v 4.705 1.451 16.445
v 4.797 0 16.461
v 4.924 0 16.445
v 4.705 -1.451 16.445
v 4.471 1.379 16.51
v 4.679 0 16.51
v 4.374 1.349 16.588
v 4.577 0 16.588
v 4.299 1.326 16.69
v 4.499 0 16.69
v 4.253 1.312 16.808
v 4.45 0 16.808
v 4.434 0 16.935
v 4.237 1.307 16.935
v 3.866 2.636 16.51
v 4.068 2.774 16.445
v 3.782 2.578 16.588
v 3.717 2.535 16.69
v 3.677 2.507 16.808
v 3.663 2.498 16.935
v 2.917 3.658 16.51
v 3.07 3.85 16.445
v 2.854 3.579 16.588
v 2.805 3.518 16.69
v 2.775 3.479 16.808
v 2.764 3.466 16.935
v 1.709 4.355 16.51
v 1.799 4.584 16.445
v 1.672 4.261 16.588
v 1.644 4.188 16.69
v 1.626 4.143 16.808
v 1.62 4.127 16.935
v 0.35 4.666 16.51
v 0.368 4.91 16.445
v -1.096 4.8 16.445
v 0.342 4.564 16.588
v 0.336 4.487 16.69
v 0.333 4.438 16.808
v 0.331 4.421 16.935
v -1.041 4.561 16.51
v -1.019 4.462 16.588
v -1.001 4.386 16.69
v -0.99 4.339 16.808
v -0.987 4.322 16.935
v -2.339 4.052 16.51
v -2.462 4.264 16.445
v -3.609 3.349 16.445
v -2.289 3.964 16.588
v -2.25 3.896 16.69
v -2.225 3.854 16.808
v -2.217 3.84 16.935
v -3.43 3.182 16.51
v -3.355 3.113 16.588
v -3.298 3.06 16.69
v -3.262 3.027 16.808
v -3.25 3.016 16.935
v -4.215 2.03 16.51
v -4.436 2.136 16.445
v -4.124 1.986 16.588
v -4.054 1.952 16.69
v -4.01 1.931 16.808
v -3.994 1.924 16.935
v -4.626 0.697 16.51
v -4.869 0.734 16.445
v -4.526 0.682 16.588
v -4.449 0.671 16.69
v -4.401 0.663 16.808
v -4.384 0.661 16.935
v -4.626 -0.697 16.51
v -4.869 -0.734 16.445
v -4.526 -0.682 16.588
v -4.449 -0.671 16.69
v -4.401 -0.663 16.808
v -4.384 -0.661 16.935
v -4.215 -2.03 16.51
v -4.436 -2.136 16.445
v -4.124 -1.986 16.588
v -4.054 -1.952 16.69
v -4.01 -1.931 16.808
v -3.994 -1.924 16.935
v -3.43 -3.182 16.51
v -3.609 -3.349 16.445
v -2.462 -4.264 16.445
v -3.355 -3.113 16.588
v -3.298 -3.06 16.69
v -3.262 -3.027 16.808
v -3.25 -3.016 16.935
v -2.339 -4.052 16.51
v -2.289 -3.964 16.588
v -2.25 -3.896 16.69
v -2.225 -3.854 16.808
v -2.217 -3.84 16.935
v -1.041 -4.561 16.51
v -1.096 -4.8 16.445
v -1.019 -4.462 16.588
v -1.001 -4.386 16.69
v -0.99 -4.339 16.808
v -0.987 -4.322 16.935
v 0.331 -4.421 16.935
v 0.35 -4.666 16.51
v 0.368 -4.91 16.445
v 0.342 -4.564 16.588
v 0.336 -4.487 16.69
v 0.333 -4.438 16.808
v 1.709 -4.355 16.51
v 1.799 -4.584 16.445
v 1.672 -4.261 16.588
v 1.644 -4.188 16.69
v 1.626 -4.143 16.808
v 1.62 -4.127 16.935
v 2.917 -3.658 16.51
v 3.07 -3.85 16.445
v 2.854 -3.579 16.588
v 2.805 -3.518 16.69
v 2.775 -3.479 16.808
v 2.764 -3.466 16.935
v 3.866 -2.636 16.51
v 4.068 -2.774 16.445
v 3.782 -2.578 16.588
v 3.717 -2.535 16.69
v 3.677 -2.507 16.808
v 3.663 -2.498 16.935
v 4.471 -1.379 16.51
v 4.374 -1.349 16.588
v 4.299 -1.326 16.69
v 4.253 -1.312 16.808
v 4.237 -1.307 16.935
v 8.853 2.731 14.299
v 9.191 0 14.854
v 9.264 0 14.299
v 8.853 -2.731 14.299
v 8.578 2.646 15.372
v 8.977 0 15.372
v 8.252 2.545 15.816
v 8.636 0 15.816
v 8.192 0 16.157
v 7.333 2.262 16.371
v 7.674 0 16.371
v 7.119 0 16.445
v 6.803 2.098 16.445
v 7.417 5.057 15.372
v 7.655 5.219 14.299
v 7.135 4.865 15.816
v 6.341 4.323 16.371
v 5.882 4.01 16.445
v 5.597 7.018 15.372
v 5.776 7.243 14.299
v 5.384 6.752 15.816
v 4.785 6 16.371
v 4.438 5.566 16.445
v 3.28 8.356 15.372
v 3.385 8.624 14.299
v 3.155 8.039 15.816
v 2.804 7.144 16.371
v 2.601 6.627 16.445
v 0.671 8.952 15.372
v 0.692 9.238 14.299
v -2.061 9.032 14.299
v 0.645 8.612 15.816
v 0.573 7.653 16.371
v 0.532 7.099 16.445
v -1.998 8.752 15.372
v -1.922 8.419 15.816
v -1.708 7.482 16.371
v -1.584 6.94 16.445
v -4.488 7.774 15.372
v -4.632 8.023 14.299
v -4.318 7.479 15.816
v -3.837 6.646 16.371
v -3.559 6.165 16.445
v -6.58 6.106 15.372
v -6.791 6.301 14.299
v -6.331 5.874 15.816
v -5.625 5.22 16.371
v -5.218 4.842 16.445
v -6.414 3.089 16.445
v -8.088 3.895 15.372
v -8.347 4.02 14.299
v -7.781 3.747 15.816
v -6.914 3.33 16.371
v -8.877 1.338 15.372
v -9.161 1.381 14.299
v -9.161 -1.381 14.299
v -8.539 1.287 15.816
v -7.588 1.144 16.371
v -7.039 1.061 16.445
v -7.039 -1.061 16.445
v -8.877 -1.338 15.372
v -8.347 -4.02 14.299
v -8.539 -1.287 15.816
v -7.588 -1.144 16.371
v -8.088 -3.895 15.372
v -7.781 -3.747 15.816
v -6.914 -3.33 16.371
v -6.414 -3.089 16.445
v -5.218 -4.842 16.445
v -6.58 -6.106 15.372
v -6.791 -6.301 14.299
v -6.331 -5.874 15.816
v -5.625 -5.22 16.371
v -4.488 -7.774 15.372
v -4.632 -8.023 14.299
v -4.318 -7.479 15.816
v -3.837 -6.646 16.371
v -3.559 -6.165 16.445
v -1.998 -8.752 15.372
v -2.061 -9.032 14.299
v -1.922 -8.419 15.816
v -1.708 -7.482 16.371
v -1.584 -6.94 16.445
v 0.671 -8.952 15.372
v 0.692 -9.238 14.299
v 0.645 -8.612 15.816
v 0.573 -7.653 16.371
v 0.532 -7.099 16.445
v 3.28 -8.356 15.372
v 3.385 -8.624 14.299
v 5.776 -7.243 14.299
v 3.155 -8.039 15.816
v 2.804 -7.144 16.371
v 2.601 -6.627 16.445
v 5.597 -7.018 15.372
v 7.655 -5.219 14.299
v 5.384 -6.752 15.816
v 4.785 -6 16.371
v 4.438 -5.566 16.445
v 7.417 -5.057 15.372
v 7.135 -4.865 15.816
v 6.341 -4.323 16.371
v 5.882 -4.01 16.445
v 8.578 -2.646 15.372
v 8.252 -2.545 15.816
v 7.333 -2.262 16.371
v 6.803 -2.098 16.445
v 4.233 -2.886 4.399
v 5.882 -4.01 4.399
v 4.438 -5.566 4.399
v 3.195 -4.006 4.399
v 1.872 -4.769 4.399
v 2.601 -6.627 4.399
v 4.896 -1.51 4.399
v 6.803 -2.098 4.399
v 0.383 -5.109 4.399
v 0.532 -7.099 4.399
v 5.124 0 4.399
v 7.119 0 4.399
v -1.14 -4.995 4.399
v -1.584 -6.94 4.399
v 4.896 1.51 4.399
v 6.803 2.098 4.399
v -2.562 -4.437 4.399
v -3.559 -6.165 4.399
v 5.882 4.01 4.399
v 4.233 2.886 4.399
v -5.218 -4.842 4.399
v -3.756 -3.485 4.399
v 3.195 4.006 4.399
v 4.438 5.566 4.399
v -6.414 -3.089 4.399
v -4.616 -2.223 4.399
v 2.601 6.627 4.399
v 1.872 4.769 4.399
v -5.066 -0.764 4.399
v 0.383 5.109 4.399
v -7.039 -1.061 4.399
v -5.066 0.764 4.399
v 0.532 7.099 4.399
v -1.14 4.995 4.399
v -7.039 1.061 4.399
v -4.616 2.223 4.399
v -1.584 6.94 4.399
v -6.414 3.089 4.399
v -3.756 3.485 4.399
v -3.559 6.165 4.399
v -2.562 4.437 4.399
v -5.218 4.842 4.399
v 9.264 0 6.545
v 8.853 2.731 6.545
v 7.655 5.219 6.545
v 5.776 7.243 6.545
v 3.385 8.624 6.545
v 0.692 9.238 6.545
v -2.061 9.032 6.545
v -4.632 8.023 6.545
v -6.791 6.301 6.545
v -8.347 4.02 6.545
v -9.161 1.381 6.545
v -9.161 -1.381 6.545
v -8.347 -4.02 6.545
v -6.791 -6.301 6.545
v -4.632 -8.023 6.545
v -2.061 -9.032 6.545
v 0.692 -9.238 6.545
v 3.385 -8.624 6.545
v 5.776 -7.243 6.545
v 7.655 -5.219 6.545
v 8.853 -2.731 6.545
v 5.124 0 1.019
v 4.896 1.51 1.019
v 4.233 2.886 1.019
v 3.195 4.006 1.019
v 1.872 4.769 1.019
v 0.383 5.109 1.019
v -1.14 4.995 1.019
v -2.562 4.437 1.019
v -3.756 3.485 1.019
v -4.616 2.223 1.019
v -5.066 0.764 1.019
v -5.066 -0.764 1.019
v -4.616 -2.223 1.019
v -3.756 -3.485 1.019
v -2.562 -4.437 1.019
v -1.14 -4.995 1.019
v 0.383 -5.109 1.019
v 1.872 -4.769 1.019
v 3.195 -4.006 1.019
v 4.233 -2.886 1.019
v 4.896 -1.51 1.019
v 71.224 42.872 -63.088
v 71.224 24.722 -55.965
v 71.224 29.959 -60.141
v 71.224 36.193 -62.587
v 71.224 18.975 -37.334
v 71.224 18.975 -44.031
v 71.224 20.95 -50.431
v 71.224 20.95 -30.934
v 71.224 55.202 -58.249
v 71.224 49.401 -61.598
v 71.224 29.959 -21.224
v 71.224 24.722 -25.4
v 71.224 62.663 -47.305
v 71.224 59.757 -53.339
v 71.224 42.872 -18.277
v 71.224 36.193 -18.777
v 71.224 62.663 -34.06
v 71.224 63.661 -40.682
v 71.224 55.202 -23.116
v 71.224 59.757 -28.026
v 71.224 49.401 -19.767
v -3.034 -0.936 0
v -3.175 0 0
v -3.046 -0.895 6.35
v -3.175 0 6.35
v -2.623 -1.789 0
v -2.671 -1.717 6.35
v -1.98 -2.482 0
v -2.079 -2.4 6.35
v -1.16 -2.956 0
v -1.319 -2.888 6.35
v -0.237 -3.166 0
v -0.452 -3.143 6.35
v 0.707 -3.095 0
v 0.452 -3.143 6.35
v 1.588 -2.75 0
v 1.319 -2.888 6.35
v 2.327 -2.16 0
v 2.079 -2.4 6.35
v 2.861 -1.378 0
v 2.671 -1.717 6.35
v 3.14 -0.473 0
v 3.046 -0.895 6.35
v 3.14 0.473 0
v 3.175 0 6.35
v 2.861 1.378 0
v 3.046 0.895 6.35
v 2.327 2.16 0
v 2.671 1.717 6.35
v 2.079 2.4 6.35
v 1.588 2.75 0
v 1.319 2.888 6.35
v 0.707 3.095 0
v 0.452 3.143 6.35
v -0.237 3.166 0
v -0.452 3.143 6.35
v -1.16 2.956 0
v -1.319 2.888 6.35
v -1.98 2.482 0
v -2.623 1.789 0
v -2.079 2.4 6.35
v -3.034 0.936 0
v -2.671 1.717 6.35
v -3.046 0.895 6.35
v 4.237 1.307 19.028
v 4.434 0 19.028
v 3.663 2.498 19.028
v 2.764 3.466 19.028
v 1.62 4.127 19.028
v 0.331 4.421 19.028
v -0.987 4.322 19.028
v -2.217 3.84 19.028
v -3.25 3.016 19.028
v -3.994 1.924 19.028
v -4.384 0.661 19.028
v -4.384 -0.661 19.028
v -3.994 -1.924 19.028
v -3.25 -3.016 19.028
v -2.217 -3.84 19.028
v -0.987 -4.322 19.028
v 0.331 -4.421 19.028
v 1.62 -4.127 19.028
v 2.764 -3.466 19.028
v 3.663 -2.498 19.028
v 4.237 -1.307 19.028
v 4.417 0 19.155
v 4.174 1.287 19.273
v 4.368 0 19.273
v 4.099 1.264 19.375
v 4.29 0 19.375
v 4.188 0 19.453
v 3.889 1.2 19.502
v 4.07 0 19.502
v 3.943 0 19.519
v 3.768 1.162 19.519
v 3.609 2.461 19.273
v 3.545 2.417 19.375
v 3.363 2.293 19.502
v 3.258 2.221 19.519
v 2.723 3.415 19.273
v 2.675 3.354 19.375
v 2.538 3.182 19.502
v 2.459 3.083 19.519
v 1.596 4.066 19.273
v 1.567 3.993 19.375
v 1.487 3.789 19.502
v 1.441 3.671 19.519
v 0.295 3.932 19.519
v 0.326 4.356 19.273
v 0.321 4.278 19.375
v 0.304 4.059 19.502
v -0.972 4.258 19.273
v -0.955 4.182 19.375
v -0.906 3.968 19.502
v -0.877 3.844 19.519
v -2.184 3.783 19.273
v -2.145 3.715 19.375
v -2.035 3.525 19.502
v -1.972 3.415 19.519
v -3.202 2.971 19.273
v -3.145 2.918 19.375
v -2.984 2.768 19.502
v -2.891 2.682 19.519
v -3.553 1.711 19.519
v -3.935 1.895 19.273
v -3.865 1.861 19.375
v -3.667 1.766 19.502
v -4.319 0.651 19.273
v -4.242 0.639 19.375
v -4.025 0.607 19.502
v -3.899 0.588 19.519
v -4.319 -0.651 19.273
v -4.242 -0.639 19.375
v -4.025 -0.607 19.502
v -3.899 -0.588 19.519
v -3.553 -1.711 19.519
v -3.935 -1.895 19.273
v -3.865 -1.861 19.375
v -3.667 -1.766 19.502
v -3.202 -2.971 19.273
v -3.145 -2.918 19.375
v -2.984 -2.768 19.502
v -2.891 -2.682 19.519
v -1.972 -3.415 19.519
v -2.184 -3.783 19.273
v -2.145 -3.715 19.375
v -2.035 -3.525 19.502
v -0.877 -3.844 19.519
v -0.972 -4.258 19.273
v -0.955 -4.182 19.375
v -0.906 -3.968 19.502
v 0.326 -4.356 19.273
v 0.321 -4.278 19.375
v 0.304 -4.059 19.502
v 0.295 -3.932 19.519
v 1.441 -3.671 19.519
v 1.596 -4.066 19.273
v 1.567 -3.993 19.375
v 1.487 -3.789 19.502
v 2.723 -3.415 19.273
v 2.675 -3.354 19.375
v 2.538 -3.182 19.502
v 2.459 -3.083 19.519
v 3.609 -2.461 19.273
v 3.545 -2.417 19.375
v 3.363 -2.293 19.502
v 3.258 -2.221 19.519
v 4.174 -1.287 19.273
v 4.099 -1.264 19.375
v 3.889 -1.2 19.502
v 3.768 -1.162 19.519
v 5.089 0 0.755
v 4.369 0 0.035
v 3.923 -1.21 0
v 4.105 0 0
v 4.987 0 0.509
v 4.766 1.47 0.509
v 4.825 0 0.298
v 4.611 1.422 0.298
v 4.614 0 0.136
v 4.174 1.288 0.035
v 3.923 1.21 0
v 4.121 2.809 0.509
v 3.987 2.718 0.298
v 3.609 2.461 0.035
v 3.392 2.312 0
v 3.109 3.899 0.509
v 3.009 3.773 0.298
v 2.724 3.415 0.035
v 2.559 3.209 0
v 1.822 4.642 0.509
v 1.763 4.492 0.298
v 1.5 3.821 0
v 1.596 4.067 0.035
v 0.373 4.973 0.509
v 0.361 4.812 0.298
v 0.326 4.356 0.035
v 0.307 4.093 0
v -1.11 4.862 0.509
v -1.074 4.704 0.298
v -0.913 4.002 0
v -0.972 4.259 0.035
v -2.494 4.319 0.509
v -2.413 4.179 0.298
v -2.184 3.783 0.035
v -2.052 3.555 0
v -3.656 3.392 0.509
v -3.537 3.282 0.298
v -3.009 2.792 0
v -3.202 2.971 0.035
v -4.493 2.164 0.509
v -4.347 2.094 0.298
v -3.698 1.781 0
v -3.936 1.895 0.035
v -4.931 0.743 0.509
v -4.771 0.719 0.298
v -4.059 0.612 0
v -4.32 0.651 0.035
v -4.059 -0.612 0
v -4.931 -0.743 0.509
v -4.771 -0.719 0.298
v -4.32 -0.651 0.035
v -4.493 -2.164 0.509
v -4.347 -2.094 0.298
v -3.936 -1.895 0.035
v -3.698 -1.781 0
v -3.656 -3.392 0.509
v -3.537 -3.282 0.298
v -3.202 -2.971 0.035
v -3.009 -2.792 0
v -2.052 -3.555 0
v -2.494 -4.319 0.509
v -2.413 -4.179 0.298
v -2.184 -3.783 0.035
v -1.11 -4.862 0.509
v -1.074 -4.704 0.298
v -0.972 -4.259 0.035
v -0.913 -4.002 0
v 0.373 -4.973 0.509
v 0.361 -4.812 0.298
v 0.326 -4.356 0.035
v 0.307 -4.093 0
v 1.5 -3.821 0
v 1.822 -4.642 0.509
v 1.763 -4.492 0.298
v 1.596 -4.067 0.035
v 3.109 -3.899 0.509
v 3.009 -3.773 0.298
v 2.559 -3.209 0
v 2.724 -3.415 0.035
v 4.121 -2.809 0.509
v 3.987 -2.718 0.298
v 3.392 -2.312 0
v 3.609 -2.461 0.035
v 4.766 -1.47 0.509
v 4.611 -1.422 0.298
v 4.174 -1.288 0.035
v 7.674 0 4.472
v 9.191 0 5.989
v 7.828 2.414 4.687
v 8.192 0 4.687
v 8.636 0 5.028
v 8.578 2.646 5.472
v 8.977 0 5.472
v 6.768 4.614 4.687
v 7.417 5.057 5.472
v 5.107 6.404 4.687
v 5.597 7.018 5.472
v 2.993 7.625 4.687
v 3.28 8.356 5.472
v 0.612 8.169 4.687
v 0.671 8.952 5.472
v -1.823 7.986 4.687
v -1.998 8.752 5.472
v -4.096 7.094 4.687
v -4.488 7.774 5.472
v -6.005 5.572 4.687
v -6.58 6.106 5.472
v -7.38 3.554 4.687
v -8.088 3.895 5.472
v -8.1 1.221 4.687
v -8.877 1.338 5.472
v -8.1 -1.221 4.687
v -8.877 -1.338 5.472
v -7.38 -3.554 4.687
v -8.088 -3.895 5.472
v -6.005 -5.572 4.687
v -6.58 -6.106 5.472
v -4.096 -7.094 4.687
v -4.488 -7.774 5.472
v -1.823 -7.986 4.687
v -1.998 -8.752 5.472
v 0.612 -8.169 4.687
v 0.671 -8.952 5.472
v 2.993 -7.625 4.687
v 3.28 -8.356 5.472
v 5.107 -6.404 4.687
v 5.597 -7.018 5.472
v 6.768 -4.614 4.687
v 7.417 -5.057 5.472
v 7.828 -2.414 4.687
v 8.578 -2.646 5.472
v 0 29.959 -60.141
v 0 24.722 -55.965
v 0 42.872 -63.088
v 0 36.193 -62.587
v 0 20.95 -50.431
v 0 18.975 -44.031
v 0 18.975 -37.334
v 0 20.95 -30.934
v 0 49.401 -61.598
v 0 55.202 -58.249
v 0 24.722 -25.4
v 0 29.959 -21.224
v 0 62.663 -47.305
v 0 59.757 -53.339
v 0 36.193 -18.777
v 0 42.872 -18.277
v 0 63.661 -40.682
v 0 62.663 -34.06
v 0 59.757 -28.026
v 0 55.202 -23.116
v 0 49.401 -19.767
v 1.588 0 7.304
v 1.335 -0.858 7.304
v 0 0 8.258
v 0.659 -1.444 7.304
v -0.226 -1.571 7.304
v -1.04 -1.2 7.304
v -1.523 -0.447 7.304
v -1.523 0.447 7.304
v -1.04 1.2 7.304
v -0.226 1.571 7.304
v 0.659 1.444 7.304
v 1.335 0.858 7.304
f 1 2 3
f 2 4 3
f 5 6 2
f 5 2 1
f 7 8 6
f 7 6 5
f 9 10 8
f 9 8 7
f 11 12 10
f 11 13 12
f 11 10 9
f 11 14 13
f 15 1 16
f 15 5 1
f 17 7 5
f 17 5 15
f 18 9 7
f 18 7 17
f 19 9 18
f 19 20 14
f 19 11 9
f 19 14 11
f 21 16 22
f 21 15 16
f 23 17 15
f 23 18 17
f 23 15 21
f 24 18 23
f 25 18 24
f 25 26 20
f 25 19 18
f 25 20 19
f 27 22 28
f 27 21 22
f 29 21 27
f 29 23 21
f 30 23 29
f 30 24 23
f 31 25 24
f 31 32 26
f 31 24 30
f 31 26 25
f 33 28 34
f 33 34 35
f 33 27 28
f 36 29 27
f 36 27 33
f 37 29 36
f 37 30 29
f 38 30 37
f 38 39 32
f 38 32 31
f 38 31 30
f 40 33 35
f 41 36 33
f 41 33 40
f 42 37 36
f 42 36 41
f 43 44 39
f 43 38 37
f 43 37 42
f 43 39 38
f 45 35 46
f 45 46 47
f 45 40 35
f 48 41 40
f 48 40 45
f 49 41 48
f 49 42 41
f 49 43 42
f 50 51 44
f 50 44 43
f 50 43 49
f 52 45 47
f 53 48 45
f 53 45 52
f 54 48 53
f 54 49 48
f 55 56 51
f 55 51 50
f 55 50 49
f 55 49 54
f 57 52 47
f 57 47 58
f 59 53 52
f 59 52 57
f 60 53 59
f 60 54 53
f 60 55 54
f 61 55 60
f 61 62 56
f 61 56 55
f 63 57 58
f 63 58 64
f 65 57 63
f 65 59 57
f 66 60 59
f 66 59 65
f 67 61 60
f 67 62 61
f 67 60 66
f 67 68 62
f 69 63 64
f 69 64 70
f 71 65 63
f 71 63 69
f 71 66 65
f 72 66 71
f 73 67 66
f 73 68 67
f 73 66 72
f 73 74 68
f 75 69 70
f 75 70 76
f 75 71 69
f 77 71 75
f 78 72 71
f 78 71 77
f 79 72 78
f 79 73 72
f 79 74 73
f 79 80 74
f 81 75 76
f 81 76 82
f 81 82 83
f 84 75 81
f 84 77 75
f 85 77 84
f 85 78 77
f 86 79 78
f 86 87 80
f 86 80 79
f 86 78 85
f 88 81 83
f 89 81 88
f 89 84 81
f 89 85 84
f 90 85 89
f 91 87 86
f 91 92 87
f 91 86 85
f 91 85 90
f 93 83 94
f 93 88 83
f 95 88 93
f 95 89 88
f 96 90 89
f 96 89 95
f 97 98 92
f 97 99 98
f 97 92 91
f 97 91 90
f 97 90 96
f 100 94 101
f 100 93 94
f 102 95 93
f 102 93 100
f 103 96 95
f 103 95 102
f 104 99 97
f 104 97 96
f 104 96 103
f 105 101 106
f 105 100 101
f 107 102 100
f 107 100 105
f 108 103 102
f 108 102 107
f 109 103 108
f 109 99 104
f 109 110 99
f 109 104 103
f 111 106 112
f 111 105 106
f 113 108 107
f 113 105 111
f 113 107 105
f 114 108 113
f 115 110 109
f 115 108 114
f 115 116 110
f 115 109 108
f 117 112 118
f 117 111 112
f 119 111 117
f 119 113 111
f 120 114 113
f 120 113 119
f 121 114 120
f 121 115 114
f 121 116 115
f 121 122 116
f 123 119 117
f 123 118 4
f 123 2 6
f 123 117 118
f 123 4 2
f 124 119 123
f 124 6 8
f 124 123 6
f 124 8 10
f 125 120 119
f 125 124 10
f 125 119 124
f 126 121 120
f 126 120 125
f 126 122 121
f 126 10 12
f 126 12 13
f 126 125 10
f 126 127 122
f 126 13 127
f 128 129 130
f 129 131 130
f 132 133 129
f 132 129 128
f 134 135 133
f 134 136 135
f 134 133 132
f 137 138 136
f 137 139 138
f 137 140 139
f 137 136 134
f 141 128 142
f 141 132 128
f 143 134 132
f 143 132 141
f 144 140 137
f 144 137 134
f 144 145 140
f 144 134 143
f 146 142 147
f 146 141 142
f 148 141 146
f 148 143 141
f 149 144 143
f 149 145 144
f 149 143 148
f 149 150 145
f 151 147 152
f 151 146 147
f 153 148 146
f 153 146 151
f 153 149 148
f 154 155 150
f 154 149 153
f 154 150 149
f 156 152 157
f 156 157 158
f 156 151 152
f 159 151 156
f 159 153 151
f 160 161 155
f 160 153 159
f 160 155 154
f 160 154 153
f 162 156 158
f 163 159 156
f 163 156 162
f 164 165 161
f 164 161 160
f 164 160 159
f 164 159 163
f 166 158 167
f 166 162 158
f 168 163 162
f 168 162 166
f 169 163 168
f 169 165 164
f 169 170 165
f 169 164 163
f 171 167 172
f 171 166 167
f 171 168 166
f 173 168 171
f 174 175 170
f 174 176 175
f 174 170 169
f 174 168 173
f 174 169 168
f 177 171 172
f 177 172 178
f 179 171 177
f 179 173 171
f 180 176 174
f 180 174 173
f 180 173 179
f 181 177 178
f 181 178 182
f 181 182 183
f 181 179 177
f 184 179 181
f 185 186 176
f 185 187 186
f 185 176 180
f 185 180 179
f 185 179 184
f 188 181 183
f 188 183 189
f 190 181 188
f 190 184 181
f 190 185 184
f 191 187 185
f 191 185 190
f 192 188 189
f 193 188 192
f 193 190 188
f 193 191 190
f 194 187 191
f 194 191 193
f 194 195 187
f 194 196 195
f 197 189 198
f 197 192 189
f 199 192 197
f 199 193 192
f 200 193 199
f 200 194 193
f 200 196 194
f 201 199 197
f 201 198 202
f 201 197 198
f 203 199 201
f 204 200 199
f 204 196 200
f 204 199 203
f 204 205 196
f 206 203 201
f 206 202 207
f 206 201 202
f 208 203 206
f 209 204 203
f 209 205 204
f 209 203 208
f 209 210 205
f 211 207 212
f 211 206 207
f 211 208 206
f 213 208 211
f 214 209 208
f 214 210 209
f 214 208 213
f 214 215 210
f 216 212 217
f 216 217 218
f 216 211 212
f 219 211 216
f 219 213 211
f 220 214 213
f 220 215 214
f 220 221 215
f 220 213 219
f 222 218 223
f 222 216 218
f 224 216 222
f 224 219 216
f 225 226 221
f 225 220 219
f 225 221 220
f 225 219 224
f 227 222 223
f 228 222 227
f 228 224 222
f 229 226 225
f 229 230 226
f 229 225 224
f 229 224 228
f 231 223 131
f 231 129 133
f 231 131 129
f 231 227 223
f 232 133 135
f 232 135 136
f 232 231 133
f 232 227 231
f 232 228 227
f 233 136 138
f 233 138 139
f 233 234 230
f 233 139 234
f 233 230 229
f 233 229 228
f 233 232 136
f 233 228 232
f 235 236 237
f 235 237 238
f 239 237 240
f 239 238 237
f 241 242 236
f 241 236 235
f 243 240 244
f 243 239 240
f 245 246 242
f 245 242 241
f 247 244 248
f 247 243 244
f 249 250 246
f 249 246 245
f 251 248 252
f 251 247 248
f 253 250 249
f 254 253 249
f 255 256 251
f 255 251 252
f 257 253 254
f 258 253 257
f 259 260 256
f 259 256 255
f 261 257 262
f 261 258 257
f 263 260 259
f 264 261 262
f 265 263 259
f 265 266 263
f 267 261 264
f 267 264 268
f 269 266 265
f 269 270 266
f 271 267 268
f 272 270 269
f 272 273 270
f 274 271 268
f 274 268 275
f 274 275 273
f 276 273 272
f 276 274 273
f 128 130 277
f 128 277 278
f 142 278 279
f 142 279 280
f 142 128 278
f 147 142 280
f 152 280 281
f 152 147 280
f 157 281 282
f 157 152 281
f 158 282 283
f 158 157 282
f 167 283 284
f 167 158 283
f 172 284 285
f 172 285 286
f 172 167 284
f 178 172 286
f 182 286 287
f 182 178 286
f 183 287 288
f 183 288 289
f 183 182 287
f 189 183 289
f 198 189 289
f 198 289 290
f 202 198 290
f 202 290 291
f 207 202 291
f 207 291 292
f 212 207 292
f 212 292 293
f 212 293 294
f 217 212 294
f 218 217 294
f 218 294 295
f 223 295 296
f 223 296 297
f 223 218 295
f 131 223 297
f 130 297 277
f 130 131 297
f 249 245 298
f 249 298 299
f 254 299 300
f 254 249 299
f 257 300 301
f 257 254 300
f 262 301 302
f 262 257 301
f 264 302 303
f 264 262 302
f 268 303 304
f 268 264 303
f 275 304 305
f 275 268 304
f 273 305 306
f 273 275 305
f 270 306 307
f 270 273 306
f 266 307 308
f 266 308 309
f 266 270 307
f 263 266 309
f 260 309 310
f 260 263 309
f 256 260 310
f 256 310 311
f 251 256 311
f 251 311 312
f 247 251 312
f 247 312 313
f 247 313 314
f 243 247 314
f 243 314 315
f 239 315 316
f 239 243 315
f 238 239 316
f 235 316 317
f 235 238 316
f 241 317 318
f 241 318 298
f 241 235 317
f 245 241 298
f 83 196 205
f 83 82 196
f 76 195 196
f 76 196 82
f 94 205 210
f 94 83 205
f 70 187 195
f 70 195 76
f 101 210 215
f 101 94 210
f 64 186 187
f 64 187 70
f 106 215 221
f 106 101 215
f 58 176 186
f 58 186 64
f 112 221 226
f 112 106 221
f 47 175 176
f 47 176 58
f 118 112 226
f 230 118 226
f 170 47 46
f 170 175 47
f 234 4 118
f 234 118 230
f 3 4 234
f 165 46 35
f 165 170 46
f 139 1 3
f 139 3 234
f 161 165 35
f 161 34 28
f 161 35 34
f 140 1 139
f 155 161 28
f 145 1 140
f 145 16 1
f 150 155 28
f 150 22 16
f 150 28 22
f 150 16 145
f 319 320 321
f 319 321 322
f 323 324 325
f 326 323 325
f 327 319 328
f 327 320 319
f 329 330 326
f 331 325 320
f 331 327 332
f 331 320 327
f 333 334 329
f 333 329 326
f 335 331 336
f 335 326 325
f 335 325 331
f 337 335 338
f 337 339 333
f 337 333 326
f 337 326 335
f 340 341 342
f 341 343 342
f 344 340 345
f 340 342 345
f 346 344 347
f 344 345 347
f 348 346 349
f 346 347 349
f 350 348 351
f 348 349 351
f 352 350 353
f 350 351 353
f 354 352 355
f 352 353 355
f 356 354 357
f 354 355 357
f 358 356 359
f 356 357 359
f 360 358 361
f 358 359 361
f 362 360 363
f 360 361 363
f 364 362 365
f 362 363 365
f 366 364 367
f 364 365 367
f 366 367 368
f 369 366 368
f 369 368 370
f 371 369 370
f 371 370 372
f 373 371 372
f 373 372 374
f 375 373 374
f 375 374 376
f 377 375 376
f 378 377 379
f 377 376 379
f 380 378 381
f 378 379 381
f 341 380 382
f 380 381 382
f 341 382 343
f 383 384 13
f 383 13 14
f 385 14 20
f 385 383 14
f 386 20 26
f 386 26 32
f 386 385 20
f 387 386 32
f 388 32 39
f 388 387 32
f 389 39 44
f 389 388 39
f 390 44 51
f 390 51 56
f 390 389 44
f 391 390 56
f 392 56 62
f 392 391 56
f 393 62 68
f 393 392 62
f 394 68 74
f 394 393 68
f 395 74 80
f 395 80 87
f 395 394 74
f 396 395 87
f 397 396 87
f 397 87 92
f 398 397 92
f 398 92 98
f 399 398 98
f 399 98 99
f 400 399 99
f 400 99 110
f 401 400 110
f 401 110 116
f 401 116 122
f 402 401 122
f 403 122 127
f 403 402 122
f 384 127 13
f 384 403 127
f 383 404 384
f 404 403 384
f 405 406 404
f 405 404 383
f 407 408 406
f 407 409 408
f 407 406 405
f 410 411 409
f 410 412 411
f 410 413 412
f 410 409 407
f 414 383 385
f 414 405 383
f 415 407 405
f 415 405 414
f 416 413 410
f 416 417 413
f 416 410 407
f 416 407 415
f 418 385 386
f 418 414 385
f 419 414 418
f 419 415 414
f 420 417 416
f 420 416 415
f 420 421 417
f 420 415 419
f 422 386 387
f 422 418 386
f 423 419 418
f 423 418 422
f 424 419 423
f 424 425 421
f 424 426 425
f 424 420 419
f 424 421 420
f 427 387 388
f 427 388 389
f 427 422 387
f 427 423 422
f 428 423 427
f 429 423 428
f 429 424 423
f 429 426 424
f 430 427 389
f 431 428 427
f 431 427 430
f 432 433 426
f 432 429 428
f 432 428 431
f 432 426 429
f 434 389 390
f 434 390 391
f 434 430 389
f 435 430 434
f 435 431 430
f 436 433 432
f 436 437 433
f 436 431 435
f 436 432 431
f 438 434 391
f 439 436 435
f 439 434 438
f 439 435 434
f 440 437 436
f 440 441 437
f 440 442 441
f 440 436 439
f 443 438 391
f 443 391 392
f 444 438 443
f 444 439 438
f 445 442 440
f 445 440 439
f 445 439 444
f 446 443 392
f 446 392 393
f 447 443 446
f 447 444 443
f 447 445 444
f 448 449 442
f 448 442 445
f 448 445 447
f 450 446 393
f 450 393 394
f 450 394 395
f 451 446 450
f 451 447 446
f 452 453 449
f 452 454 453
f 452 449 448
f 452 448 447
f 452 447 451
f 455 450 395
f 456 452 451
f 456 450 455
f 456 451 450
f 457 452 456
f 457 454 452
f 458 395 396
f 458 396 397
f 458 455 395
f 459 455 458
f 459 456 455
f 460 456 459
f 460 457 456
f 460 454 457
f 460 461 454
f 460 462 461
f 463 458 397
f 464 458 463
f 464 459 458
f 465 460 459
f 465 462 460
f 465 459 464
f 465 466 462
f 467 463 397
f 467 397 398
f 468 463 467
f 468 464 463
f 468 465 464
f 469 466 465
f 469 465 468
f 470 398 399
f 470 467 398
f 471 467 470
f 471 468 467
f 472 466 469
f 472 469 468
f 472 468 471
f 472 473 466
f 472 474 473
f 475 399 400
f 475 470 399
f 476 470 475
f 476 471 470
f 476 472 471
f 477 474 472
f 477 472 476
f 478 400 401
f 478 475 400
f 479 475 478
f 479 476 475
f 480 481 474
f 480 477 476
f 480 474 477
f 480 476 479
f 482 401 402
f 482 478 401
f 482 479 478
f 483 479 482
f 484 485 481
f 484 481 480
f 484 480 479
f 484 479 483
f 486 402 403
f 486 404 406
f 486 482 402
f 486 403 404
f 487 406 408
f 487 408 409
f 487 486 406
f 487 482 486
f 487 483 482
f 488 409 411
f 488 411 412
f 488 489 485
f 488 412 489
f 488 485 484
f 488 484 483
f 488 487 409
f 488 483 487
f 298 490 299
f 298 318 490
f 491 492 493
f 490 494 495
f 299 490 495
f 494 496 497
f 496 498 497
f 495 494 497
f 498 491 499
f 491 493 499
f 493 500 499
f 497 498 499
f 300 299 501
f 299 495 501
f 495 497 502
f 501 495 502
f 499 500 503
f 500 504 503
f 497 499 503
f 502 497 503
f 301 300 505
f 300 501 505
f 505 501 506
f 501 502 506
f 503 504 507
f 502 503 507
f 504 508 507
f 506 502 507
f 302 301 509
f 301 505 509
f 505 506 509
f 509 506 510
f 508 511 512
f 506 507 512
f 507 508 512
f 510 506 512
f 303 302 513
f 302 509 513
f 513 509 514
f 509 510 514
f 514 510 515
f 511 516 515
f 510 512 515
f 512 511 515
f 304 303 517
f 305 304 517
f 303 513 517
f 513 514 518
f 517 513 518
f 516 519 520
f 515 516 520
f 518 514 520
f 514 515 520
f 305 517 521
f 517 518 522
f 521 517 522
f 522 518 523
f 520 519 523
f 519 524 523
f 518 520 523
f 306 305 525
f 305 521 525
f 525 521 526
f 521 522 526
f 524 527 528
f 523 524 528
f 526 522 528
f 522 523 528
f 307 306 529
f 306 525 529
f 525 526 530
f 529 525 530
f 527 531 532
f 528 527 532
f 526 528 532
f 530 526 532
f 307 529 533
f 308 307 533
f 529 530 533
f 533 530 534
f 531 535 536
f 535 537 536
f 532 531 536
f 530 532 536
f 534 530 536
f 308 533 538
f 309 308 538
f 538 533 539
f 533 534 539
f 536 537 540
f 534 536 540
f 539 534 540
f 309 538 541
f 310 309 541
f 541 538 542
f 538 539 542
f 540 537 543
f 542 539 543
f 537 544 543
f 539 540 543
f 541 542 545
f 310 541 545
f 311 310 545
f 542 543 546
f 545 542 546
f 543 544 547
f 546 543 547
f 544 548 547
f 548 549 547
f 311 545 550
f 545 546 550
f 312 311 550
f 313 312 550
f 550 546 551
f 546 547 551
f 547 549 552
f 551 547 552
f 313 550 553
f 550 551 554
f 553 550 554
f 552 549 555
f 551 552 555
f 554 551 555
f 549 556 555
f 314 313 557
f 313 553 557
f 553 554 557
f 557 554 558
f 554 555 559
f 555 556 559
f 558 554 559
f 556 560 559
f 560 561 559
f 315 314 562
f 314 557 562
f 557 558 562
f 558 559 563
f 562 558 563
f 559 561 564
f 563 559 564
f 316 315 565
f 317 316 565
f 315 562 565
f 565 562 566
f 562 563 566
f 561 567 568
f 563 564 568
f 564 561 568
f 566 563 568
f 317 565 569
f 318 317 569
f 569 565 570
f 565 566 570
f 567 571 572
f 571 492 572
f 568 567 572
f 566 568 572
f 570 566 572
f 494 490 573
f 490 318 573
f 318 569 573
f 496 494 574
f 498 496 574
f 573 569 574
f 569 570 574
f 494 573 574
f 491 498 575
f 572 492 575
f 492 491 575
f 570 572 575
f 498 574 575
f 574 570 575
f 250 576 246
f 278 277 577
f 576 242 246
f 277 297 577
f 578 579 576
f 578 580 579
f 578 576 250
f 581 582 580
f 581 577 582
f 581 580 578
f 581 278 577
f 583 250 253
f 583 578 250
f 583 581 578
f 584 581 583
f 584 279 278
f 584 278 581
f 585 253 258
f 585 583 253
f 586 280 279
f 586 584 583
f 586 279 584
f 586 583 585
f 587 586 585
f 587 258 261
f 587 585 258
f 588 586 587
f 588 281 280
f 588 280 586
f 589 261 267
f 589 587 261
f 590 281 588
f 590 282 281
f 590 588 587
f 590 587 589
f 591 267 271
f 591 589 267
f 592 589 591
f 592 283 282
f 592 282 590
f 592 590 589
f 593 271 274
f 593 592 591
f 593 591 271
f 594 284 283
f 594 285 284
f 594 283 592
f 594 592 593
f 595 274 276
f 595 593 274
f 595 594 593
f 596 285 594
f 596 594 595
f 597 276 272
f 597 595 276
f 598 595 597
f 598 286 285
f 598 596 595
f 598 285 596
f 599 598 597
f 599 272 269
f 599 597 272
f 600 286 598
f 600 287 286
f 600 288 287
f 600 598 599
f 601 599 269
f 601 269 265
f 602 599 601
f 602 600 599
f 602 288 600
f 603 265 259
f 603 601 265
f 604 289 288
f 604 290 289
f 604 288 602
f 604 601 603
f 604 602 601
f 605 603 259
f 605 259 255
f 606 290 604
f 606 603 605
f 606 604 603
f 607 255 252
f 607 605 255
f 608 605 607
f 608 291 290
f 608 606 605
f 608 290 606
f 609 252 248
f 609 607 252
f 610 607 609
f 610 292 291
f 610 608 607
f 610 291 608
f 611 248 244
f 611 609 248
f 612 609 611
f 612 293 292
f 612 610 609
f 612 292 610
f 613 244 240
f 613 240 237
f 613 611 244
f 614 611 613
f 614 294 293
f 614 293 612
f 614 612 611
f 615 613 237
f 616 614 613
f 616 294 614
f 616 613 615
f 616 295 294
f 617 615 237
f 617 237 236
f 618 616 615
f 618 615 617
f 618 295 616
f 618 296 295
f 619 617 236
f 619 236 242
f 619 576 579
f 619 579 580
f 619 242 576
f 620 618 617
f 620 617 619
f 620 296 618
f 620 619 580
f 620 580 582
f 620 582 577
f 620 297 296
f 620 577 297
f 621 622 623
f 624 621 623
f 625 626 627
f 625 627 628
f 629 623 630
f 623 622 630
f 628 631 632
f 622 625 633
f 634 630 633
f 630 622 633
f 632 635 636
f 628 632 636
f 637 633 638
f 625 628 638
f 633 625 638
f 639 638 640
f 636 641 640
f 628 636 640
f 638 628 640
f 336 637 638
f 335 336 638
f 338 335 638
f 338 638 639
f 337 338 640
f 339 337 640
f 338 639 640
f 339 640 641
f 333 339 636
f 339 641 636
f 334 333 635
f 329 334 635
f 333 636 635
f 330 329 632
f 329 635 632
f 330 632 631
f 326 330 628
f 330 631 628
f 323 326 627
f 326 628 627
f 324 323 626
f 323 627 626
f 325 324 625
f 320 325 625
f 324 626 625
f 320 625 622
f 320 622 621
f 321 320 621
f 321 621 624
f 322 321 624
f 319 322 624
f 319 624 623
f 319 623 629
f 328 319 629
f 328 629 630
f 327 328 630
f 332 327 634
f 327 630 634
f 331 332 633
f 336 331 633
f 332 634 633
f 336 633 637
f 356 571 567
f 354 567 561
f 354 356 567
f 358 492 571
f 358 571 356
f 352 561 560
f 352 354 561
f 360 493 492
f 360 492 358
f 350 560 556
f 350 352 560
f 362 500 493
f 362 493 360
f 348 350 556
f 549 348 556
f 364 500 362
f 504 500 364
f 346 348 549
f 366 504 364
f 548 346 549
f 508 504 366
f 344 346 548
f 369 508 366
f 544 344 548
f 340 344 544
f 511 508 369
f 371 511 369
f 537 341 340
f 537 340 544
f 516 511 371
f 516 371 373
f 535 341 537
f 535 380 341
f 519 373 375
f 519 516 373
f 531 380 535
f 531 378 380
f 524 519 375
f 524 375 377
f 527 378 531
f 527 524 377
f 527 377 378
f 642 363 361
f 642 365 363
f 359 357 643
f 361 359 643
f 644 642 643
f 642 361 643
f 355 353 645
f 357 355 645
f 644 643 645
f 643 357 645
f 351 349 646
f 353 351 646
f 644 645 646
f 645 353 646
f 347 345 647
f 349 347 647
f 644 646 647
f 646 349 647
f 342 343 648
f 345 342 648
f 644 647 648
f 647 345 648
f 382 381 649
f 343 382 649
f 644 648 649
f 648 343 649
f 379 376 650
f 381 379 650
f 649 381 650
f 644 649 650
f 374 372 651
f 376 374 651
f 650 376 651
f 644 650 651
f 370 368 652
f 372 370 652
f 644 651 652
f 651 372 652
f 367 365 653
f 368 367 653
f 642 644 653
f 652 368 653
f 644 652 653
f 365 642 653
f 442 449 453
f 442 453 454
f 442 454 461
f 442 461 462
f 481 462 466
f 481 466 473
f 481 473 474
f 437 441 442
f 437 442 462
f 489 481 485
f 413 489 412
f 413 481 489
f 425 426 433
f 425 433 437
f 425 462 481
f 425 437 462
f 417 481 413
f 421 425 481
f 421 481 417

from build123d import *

# Parameters (mm, degrees)
F2_R     = 2.145498841
F4_R     = 0.4903403449
F6_D     = 6.35
F6_DEPTH = 6.35
F6_TIP   = 1.9077324654
F7_R     = 1.0187545891
F3_R     = 22.4683237684
F8_DEPTH = 71.223795414


with BuildPart() as f1:
    # F0 (on Front) → F1 (revolve)
    with BuildSketch(Plane.XZ):
        Polygon((4.4335573912, 19.5186324418), (0, 19.5186324418), (0, 0), (5.1236599684, 0), (5.1236599684, 4.3991170824), (9.2642754316, 4.3991170824), (9.2642754316, 16.4445396513), (4.4335573912, 16.4445396513), align=None)
    revolve(axis=Axis((0, 0, 9.7593162209), (0, 0, 1)))

    # F2
    f2_edges = [f1.edges().sort_by_distance(p)[0] for p in [
        (-9.264275, 0, 16.44454),
        (-9.264275, 0, 4.399117),
        (9.264275, 0, 10.421828),
    ]]
    fillet(f2_edges, radius=F2_R)

    # F4
    f4_edges = [f1.edges().sort_by_distance(p)[0] for p in [
        (-4.433557, 0, 19.518632),
        (-4.433557, 0, 16.44454),
        (4.433557, 0, 17.981586),
    ]]
    fillet(f4_edges, radius=F4_R)

    # F6
    with Locations(Plane(origin=(0, 0, 0), x_dir=(1, 0, 0), z_dir=(0, 0, -1))):
        with Locations((0, 0)):
            Hole(F6_D / 2, depth=F6_DEPTH)
            with Locations((0, 0, -(F6_DEPTH + F6_TIP / 2))):  # 118° drill point
                Cone(0, F6_D / 2, F6_TIP, mode=Mode.SUBTRACT)

    # F7
    f7_edges = [f1.edges().sort_by_distance(p)[0] for p in [
        (-9.264275, 0, 6.544616),
        (-5.12366, 0, 0),
        (-9.264275, 0, 14.299041),
        (-4.433557, 0, 19.028292),
    ]]
    fillet(f7_edges, radius=F7_R)


with BuildPart() as f8:
    # F3 (on Right) → F8 (new body)
    with BuildSketch(Plane.YZ):
        with Locations((41.1928445101, -40.6823679805)):
            Circle(F3_R)
    extrude(amount=F8_DEPTH)


solid = Compound([f1.part, f8.part])
